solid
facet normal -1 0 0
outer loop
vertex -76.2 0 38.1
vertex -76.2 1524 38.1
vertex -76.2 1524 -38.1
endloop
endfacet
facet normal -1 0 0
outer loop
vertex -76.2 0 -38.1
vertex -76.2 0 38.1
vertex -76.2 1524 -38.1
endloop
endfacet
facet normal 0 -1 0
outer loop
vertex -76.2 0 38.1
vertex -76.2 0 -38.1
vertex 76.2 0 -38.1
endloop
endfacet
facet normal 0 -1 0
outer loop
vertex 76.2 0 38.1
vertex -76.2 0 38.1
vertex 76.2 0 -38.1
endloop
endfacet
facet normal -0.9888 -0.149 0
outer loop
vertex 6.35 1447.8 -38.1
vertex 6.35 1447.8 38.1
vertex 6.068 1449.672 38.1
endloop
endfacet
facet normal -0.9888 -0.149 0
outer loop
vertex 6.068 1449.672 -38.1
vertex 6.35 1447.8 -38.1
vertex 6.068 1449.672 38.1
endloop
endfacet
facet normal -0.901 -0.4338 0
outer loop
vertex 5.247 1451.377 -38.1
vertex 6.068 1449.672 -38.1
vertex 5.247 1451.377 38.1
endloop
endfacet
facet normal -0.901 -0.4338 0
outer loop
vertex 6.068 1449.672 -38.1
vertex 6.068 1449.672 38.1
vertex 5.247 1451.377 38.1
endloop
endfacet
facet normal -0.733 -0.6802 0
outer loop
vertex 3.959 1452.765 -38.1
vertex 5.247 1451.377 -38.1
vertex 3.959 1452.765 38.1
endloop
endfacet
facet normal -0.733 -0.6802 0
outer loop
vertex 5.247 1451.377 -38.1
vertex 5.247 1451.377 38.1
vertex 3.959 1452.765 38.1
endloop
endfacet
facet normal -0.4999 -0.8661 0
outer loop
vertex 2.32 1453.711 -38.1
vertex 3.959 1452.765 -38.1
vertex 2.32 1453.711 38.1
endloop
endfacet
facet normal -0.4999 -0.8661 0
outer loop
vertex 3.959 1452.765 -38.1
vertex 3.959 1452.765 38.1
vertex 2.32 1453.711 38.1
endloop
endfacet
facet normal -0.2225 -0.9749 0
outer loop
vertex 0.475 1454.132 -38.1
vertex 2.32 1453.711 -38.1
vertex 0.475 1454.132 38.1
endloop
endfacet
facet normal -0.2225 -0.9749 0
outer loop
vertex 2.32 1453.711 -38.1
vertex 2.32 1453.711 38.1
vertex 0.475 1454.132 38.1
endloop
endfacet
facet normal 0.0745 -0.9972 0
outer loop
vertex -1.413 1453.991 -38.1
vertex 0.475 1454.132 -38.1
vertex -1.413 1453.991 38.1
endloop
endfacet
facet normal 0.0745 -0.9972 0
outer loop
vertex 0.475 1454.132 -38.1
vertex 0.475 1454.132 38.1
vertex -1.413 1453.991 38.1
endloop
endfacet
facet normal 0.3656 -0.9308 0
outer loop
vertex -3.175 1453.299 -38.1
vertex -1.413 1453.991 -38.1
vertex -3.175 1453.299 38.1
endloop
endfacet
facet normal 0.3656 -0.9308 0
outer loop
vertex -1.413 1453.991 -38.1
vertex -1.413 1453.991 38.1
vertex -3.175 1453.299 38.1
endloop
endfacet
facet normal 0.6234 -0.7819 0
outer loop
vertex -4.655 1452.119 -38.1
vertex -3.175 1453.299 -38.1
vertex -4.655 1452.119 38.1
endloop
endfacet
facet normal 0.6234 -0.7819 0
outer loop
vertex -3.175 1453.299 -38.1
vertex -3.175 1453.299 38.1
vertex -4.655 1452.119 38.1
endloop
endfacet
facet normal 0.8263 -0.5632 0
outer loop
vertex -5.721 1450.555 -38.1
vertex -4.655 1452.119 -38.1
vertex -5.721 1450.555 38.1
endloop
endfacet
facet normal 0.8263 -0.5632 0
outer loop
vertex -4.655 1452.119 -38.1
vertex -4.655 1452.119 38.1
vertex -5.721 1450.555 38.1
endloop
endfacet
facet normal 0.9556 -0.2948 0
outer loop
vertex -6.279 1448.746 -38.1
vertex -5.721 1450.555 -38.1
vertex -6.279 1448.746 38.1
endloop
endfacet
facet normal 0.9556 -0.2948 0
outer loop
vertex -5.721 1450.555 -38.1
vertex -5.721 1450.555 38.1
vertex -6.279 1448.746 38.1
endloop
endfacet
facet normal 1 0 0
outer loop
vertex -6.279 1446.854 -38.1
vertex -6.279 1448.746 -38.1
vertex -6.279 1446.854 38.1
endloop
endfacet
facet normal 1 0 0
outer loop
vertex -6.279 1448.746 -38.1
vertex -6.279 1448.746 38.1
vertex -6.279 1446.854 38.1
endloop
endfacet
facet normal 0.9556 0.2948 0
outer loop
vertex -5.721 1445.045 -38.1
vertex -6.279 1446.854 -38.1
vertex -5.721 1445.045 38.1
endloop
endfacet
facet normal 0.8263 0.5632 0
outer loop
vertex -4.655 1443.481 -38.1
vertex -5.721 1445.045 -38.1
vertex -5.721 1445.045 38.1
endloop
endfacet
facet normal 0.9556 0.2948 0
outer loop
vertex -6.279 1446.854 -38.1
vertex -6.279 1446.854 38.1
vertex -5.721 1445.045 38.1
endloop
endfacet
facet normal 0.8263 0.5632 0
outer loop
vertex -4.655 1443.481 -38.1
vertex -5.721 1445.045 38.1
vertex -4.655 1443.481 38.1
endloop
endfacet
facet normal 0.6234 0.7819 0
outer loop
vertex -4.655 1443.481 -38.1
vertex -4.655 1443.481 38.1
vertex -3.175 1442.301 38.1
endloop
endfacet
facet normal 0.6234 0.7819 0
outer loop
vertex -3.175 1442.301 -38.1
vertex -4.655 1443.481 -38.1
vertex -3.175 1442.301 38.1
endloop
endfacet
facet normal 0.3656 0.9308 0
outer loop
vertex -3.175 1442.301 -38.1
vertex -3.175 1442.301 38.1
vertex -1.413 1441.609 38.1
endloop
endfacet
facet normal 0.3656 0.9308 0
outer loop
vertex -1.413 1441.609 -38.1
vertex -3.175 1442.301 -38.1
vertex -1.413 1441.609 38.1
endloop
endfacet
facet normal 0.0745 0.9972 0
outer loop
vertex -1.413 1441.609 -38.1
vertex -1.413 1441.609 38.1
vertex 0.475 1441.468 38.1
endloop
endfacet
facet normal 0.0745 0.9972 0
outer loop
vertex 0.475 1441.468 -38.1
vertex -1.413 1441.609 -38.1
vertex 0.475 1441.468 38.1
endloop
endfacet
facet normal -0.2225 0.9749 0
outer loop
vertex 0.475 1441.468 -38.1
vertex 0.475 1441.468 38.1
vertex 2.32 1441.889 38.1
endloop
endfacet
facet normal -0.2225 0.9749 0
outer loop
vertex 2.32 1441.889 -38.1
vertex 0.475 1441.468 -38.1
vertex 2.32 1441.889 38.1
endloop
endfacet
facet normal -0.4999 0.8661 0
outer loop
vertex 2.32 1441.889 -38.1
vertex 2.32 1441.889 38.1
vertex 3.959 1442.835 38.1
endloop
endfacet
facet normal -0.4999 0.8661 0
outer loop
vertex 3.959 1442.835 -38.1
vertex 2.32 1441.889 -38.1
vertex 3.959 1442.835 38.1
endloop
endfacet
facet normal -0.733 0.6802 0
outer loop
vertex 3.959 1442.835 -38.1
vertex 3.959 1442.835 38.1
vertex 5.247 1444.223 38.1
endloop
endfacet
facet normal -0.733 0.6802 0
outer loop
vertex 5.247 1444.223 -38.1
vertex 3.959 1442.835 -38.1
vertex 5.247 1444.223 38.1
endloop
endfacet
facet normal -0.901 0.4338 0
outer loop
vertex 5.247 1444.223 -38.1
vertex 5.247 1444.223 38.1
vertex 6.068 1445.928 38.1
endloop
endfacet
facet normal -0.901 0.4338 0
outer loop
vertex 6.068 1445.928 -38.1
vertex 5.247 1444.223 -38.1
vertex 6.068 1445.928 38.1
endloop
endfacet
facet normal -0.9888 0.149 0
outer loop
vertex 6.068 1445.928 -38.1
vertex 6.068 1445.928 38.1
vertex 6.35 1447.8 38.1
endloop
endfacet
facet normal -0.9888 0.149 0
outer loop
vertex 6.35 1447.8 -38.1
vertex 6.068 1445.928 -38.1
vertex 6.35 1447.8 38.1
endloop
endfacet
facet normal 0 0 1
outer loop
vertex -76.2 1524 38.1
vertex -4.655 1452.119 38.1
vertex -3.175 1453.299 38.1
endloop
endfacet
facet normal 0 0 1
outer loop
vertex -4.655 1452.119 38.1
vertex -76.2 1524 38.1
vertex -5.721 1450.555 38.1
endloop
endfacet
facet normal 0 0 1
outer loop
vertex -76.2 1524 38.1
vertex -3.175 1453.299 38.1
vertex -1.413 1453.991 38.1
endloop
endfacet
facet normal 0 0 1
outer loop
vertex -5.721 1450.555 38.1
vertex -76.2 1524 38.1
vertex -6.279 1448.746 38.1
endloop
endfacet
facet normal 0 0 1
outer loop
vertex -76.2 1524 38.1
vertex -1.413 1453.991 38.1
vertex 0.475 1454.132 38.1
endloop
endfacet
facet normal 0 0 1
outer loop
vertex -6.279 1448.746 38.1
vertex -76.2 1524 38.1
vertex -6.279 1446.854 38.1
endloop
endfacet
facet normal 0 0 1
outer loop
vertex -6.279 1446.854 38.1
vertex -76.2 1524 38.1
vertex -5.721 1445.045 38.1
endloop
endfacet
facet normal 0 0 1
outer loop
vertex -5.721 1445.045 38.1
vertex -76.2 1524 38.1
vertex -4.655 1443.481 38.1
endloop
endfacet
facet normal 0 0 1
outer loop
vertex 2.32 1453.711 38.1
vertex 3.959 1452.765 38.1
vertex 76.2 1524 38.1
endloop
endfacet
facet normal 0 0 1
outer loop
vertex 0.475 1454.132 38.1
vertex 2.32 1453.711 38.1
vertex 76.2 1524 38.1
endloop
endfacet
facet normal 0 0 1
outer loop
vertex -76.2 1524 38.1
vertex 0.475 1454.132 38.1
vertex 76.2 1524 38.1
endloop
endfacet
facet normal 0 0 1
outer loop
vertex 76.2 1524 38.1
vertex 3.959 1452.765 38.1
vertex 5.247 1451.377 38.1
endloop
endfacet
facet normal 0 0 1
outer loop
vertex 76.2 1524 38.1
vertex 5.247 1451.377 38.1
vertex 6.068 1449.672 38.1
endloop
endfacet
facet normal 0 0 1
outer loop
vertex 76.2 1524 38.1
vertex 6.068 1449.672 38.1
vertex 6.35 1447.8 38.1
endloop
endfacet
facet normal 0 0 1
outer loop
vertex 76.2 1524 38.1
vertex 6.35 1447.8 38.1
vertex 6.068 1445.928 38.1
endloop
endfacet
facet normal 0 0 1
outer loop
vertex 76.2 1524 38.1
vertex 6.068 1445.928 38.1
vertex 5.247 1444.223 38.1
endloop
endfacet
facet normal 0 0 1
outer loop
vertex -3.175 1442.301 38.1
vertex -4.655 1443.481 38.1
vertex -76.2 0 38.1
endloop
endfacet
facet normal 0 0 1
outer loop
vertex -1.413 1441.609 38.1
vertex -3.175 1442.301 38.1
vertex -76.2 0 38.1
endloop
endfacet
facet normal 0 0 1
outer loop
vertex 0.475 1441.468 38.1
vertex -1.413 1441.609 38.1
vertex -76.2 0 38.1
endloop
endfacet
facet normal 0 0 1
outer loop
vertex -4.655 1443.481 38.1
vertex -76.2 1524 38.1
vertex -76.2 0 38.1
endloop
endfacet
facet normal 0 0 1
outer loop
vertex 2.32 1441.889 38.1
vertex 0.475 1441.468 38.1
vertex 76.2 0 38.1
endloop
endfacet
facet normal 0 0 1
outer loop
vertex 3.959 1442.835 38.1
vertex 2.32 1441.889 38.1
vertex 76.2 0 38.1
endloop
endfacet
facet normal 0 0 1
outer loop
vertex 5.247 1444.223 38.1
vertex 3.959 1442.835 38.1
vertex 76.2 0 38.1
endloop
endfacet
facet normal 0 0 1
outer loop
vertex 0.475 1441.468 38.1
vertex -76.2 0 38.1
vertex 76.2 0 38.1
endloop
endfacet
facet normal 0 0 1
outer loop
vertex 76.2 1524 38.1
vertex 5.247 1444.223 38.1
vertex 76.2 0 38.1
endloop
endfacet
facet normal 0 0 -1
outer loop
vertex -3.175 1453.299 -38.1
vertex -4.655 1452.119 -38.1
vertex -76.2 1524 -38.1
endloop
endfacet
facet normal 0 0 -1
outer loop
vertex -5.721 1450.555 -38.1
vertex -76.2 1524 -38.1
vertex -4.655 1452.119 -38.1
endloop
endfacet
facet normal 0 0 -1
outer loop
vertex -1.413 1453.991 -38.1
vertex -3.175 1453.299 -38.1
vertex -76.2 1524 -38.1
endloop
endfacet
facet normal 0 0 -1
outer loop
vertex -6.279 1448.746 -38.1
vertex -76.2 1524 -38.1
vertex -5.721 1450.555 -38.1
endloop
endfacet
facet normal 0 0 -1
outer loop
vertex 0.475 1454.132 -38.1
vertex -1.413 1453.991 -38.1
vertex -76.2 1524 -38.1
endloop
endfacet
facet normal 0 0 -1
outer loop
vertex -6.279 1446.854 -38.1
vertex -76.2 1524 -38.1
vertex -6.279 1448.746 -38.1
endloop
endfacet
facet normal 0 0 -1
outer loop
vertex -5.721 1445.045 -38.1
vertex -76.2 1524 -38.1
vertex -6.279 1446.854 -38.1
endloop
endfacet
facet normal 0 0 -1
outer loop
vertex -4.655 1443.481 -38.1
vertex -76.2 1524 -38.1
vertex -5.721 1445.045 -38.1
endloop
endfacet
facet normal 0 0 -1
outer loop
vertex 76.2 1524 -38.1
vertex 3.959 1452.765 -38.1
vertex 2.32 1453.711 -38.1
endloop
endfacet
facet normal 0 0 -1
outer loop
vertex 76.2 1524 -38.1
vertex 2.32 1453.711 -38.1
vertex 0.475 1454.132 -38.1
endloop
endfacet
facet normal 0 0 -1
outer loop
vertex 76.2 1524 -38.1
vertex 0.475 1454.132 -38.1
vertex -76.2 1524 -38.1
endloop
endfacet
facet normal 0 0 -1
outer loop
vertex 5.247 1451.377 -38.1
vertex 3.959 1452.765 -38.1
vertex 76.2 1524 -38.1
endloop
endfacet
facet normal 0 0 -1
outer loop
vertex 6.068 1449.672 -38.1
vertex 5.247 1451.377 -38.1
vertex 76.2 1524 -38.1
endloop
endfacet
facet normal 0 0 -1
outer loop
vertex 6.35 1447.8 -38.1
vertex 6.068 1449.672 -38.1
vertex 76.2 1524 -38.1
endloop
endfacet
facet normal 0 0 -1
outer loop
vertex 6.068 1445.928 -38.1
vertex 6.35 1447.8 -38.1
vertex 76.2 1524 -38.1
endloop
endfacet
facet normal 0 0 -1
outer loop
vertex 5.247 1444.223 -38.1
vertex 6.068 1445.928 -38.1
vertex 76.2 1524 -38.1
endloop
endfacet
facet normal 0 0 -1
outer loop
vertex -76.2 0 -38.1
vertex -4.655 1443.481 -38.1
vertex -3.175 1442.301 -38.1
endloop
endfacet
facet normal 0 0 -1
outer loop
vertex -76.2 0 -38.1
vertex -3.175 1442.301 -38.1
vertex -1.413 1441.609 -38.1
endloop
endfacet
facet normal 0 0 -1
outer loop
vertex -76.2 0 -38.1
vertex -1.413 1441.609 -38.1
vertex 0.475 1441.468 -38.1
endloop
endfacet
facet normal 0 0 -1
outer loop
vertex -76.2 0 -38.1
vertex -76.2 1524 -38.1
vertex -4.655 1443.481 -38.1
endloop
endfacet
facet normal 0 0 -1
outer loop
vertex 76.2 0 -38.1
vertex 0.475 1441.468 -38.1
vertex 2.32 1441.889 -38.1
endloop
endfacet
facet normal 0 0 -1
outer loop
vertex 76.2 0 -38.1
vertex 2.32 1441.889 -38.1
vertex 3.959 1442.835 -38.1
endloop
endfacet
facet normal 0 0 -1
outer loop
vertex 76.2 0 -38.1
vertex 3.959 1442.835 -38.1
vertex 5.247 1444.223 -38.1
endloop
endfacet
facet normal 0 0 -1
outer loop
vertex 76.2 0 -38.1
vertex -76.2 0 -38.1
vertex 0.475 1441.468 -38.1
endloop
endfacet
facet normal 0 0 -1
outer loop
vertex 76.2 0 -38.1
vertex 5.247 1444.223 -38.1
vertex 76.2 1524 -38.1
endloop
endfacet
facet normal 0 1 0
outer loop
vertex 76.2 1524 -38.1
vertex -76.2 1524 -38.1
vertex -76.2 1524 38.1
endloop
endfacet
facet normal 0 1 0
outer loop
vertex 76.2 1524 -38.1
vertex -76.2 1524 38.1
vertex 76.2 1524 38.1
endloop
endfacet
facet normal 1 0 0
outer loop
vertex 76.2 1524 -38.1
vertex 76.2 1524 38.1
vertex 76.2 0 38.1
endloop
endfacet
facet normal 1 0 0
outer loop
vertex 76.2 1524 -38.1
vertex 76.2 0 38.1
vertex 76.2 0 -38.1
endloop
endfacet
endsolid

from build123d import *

# Parameters (mm, degrees)
SKETCH1_W           = 152.4
SKETCH1_H           = 76.2
BOSS_EXTRUDE1_DEPTH = 1524
CUT_EXTRUDE1_REACH  = 1529.805
SKETCH2_R           = 6.35


with BuildPart() as part:
    # Sketch1 → Boss-Extrude1 (new body)
    with BuildSketch(Plane(origin=(0, 0, 0), x_dir=(1, 0, 0), z_dir=(0, 1, 0))):
        Rectangle(SKETCH1_W, SKETCH1_H)
    extrude(amount=BOSS_EXTRUDE1_DEPTH)

    # Sketch2 → Cut-Extrude1 (cut, up to next)
    with BuildSketch(Plane.XY.offset(38.1), mode=Mode.PRIVATE) as cut_extrude1_sk1:
        with Locations((0, 1447.8)):
            Circle(SKETCH2_R)
    cut_extrude1_tool1 = extrude(cut_extrude1_sk1.sketch, amount=-CUT_EXTRUDE1_REACH, mode=Mode.PRIVATE) & part.part
    add(cut_extrude1_tool1.solids().sort_by_distance((0, 1447.8, 38.1))[0], mode=Mode.SUBTRACT)


solid = part.part
